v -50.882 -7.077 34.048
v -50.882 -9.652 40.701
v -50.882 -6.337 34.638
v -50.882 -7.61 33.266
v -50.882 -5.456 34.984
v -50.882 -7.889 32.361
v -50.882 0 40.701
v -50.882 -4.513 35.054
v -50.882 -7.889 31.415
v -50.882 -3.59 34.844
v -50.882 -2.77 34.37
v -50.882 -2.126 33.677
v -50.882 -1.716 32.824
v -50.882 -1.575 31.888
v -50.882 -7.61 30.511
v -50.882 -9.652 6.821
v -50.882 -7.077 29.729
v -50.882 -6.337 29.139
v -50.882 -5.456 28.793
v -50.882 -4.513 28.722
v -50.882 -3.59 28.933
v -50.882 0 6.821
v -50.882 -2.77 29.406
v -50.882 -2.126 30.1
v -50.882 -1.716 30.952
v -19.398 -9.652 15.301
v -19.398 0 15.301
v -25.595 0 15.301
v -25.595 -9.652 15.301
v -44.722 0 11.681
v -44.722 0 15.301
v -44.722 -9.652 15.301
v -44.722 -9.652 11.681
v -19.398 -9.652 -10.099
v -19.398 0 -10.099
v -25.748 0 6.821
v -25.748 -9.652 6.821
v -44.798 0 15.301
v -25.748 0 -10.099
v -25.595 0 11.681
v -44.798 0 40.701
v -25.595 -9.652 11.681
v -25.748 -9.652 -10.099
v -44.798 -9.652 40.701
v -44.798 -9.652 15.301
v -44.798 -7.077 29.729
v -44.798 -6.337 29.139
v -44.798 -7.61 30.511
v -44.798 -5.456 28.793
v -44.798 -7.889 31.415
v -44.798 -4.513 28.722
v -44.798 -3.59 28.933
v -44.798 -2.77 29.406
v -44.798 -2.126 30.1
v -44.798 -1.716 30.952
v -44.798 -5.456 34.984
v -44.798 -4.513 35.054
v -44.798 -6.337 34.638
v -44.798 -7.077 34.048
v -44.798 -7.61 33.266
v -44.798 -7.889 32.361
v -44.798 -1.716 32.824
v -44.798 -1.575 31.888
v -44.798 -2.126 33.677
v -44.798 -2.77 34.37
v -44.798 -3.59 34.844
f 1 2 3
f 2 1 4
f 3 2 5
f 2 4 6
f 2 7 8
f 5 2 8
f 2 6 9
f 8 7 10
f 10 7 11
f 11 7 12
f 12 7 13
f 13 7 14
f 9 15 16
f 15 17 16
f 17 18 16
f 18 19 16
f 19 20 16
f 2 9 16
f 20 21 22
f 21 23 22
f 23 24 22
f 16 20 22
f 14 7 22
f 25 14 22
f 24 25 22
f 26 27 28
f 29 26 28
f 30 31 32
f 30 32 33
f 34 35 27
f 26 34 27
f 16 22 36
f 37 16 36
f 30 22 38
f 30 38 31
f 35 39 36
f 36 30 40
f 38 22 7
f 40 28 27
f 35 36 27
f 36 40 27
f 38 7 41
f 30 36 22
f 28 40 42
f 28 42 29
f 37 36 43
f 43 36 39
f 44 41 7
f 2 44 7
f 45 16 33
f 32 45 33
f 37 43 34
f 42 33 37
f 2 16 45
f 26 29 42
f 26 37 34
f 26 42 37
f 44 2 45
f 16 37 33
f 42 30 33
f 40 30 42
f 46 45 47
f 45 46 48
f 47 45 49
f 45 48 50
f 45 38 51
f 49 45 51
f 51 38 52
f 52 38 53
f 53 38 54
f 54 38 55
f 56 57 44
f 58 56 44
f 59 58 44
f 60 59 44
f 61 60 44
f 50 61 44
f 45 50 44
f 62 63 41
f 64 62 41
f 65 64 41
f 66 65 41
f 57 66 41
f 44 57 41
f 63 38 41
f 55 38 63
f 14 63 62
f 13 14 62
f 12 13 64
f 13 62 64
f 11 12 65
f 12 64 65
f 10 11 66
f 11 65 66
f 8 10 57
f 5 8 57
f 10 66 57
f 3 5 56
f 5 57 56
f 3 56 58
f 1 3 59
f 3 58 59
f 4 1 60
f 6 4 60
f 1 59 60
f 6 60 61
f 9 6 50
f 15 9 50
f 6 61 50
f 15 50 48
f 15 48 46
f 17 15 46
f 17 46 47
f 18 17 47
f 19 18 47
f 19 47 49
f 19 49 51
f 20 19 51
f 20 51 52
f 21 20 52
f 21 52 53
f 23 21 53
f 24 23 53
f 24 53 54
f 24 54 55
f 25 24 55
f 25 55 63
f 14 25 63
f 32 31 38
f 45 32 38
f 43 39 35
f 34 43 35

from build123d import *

# Parameters (mm, degrees)
F1_DEPTH = 9.652
F3_R     = 3.175
F4_DEPTH = 55.88
F5_W     = 19.1262
F5_H     = 2.54
F5_H_2   = 1.292995
F6_DEPTH = 25.4


with BuildPart() as f1:
    # F0 (on Front) → F1 (new body)
    with BuildSketch(Plane.XZ):
        Polygon((-44.798229, 15.301452), (-44.798229, 40.701452), (-50.881937, 40.701452), (-50.881937, 6.821129), (-25.748229, 6.821129), (-25.748229, -10.098548), (-19.398229, -10.098548), (-19.398229, 15.301452), align=None)
    extrude(amount=F1_DEPTH)

    # F3 (on Right) → F4 (cut)
    with BuildSketch(Plane.YZ):
        with Locations((-4.7498, 31.888157)):
            Circle(F3_R)
    extrude(amount=-F4_DEPTH, mode=Mode.SUBTRACT)

    # F5 (on Front) → F6 (cut)
    with BuildSketch(Plane.XZ):
        with Locations((-35.158537, 12.950574)):
            Rectangle(F5_W, F5_H)
        with Locations((-35.158537, 14.867071)):
            Rectangle(F5_W, F5_H_2)
    extrude(amount=F6_DEPTH, mode=Mode.SUBTRACT)


solid = f1.part
